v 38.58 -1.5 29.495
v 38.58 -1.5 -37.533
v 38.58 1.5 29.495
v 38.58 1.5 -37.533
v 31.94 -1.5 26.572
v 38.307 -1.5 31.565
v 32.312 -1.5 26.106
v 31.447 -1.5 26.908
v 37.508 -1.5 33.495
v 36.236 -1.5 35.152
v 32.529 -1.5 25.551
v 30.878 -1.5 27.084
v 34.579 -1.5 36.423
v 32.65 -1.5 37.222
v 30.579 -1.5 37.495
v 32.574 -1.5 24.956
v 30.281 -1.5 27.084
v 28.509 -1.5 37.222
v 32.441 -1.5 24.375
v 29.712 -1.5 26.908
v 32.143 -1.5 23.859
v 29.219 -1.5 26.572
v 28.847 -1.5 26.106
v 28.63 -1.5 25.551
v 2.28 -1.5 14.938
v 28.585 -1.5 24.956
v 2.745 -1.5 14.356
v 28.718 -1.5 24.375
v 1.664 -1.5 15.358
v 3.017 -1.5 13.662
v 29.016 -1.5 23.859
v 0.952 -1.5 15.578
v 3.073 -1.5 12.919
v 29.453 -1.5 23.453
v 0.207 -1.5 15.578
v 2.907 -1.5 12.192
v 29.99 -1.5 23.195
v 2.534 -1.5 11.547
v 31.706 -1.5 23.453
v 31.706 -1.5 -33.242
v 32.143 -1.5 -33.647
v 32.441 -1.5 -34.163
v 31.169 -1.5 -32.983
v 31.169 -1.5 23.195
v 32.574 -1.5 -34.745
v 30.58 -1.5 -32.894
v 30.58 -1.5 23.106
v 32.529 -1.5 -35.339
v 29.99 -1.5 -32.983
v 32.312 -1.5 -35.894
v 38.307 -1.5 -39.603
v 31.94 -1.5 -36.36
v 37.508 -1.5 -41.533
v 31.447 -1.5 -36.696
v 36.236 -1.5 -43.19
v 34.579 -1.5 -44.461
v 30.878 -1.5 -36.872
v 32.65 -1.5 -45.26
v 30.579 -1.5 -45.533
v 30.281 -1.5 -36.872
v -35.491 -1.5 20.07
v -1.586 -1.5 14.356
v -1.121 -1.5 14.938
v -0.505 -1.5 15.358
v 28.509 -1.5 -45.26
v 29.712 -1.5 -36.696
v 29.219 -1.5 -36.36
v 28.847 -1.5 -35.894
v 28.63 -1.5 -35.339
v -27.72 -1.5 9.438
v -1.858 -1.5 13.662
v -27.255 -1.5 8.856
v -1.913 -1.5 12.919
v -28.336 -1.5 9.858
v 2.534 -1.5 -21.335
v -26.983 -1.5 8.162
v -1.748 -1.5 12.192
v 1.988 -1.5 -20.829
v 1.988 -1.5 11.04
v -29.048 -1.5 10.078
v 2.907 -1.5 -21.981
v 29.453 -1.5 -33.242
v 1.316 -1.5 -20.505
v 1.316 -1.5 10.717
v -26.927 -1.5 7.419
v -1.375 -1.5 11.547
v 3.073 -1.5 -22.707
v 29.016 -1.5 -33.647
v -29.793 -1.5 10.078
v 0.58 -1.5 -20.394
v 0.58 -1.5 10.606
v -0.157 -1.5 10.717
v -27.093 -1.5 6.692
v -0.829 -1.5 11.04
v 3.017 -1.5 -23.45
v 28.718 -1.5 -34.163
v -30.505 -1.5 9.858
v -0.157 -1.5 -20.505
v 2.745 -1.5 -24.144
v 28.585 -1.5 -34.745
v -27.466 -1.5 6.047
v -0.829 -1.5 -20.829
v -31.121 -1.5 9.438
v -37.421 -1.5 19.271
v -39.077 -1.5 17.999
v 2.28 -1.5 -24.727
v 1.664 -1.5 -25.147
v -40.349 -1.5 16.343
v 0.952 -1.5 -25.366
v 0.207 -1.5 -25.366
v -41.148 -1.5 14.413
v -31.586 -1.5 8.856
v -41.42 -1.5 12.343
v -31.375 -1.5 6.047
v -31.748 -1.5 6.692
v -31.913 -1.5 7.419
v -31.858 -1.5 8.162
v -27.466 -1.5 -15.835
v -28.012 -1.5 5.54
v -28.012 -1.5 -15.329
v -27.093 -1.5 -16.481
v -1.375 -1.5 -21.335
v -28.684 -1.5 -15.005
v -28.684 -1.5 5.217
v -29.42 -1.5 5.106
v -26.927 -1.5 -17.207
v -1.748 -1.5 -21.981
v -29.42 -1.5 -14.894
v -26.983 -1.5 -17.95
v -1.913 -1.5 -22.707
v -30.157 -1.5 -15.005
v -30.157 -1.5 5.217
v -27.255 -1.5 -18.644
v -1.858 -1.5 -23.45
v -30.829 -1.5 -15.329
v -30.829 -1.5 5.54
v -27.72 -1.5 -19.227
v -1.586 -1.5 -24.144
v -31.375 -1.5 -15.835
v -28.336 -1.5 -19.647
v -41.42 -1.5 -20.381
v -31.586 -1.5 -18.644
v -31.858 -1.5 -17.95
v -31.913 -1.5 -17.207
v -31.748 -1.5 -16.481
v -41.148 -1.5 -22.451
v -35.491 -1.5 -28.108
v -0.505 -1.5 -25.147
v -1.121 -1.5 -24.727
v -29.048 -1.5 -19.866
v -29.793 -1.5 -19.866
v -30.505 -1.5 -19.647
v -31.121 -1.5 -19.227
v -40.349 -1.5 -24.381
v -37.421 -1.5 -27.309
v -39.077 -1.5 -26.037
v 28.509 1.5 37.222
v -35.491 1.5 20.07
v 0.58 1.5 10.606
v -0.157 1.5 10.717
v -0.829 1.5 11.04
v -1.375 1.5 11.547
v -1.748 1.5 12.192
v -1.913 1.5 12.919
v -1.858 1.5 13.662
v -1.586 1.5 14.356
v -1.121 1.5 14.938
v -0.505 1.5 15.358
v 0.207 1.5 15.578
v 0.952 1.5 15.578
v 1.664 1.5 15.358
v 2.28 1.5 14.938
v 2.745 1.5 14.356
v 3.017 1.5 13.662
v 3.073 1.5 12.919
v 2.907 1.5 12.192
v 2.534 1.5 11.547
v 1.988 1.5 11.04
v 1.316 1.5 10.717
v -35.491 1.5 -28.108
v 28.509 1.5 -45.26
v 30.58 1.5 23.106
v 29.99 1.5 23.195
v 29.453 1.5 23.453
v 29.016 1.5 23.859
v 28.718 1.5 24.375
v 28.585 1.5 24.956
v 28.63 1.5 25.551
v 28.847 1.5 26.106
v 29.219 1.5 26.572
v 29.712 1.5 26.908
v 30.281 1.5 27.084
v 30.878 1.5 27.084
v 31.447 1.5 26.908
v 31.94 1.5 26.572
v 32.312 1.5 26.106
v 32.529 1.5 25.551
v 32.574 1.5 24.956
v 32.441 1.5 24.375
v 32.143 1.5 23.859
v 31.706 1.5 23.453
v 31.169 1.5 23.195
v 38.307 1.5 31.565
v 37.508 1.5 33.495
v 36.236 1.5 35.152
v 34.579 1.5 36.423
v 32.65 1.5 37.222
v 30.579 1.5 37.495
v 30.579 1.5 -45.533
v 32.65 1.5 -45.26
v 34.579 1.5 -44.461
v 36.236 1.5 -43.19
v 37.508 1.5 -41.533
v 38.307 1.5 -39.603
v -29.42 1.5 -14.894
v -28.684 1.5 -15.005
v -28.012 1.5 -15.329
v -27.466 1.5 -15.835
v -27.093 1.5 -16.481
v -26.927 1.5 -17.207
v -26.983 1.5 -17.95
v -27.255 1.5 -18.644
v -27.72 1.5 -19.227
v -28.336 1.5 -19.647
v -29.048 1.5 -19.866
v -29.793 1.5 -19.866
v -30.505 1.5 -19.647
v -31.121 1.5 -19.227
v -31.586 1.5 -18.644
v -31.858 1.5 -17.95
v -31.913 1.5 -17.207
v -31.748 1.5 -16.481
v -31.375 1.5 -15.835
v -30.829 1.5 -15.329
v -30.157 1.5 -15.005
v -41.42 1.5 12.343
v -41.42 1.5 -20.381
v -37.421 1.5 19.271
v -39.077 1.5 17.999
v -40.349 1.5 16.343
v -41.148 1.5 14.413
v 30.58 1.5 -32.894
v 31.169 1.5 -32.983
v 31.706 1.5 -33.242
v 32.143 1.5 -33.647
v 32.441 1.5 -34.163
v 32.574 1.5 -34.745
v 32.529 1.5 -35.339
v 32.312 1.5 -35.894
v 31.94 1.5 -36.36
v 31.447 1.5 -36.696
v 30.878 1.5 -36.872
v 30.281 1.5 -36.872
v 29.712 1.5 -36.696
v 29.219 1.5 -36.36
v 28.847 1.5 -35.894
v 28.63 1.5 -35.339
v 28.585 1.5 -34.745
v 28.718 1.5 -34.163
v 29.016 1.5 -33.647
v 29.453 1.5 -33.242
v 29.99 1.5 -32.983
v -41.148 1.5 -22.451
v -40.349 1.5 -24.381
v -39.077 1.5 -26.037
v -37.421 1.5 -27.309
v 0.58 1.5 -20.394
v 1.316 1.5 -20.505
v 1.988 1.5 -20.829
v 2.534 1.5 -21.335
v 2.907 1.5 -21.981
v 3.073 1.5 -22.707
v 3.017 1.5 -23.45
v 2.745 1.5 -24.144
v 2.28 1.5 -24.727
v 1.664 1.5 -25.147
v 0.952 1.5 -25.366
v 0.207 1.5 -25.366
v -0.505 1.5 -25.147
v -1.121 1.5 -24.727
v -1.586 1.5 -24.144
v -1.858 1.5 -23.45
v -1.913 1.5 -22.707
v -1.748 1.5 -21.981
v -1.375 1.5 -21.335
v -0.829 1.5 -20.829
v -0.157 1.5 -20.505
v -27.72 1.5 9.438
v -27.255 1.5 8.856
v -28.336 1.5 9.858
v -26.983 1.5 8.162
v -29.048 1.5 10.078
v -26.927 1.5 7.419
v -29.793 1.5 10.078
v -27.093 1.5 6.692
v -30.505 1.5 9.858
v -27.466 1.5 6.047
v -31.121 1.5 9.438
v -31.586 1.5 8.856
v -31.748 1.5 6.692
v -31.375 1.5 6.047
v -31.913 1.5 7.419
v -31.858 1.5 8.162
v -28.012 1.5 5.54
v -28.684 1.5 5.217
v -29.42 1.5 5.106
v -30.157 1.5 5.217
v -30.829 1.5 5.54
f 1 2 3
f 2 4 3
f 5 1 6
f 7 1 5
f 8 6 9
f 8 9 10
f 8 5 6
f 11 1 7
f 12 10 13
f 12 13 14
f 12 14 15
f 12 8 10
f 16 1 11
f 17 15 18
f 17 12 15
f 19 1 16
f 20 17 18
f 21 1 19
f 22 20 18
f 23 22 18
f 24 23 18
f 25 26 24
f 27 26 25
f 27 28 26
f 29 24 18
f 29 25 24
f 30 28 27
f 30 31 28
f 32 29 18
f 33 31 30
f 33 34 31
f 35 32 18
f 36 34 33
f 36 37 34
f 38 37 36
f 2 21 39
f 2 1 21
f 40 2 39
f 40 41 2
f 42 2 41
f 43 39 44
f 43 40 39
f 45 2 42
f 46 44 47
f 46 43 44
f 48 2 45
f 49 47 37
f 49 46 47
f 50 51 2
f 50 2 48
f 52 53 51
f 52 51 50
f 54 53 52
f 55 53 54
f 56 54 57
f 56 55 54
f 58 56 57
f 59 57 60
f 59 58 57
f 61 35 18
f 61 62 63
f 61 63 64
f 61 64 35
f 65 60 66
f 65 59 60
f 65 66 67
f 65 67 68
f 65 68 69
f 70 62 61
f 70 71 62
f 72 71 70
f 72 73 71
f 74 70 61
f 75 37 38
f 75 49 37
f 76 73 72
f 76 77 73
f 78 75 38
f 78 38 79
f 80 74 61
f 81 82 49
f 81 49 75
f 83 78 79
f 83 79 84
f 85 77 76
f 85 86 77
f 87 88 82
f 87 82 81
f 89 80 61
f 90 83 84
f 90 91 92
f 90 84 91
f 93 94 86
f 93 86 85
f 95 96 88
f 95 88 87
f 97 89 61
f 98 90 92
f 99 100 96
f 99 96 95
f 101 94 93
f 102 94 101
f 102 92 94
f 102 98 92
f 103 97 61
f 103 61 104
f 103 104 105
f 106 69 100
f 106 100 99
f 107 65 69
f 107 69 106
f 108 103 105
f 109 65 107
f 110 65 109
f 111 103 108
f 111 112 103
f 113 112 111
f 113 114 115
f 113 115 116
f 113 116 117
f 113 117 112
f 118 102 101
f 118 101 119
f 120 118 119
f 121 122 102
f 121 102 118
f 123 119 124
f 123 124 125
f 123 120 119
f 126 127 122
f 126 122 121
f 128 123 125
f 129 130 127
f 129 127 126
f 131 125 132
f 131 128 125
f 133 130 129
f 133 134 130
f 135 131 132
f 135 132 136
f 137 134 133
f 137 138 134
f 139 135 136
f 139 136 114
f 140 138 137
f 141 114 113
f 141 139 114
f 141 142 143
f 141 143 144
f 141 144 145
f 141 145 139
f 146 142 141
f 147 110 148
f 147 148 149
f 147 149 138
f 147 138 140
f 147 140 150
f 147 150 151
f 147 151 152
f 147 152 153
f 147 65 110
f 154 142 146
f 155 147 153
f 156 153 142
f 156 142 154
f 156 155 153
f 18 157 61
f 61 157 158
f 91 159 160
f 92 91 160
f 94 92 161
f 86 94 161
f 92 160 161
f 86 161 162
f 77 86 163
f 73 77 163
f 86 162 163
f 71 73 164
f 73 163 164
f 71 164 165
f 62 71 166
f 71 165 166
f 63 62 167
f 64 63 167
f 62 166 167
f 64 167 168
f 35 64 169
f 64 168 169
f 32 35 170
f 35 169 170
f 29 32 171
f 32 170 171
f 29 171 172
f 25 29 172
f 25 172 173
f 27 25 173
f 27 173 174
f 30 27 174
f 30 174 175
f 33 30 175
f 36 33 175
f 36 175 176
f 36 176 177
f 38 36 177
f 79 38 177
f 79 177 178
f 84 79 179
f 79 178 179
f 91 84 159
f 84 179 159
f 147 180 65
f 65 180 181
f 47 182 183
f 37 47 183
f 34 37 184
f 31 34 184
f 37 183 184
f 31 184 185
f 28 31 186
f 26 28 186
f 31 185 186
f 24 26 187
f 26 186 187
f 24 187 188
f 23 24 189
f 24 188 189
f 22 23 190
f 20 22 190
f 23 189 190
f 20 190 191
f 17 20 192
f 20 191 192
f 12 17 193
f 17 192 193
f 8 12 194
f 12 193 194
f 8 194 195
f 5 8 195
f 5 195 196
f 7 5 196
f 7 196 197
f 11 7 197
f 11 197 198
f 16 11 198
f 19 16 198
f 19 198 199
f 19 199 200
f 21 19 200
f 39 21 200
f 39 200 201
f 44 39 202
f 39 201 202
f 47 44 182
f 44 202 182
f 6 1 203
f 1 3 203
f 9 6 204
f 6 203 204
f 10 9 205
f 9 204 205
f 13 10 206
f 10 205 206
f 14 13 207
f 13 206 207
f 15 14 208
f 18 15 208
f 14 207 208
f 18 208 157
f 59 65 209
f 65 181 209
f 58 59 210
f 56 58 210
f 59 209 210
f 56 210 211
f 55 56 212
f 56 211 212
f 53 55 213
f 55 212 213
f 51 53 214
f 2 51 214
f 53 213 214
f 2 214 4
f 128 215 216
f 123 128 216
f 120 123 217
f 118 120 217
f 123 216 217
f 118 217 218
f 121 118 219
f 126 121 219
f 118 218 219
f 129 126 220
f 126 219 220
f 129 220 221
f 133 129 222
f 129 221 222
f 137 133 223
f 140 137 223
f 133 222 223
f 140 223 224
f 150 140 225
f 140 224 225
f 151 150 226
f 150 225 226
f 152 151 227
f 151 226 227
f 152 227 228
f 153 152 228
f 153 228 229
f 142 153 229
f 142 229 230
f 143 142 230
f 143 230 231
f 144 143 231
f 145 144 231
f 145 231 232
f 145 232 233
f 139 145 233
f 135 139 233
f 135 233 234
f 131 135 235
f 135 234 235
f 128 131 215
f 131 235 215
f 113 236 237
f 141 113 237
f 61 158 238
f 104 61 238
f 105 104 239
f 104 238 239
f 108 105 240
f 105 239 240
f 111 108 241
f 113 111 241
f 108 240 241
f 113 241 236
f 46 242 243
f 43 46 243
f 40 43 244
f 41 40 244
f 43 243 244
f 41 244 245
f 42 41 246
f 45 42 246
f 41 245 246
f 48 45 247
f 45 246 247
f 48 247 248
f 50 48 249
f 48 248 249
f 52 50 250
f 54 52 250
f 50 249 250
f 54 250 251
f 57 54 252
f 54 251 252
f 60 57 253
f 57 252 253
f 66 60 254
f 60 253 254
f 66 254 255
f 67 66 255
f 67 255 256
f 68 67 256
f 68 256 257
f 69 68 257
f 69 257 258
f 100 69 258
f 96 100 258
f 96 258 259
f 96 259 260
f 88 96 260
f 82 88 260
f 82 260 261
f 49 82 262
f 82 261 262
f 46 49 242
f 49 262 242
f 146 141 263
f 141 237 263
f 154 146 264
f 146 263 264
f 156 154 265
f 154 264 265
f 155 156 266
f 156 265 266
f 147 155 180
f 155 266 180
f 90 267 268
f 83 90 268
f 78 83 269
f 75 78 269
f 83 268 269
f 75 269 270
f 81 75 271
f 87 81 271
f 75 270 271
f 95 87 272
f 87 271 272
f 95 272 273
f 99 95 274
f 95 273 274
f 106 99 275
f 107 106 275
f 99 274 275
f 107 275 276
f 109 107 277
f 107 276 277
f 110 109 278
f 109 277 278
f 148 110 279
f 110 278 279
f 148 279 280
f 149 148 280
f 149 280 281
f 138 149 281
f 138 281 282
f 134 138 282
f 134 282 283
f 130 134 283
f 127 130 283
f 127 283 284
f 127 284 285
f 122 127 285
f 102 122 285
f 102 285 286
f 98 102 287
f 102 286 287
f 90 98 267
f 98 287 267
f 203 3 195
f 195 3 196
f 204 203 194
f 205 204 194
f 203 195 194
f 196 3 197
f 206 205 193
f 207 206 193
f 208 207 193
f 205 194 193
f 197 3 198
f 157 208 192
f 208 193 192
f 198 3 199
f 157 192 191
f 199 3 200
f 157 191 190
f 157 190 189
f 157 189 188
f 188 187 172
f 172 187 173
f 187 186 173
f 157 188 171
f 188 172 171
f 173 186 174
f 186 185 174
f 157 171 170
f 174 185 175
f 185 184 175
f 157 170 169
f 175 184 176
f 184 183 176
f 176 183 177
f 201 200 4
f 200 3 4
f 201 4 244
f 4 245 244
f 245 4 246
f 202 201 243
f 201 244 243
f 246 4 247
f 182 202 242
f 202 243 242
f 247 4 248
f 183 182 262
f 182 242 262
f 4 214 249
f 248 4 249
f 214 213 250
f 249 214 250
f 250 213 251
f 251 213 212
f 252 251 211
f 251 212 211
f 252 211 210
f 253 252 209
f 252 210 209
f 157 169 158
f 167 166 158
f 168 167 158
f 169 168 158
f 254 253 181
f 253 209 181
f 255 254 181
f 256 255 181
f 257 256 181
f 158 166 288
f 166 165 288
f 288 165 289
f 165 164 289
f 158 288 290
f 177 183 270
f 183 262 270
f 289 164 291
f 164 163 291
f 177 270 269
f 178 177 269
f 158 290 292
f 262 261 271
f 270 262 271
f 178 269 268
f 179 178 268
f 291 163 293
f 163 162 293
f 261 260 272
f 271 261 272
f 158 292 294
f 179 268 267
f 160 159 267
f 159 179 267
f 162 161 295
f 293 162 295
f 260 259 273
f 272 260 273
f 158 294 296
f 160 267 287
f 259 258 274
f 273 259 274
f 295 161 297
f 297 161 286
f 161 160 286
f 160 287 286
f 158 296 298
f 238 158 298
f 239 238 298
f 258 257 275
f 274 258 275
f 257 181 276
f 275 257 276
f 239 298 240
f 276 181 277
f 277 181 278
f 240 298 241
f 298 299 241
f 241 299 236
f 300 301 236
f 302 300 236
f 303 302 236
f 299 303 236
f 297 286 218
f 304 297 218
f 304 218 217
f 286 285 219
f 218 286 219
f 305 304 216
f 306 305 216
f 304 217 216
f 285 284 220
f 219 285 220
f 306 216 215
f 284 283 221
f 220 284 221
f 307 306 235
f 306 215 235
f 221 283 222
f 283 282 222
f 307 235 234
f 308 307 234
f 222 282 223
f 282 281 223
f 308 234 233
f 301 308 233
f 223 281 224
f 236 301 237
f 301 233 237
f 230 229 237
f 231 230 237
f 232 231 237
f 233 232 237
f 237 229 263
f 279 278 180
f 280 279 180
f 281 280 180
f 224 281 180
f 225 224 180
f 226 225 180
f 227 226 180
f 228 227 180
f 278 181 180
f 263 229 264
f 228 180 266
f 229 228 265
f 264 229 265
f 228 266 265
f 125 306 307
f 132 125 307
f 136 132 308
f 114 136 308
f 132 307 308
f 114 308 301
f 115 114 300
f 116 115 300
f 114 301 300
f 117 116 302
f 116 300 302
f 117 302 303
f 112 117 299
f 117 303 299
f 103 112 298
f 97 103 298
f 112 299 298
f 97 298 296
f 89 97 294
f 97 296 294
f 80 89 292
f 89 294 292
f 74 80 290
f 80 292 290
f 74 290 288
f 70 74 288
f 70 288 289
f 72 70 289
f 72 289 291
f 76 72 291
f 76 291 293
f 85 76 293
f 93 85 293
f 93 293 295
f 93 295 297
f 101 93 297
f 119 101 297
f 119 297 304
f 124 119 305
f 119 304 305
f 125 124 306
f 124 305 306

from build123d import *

# Parameters (mm, degrees)
BOSS_EXTRUDE1_DEPTH = 1.5
SKETCH3_R           = 2
SKETCH3_R_2         = 2.5
CUT_EXTRUDE1_DEPTH  = 3


with BuildPart() as part:
    # Sketch2 → Boss-Extrude1 (new, symmetric)
    with BuildSketch(Plane(origin=(0, 0, 0), x_dir=(1, 0, 0), z_dir=(0, 1, 0))):
        with BuildLine():
            Line((-41.420454545, -12.342725783), (-41.420454545, 20.380644913))
            ThreePointArc((-41.420454545, 20.380644913), (-39.767396696, 25.250585912), (-35.49137321, 28.107953363))
            Line((-35.49137321, 28.107953363), (28.50862679, 45.259953363))
            ThreePointArc((28.50862679, 45.259953363), (35.449486454, 43.879587063), (38.579545455, 37.532644913))
            Line((38.579545455, 37.532644913), (38.579545455, -29.494725783))
            ThreePointArc((38.579545455, -29.494725783), (35.449486454, -35.841667933), (28.50862679, -37.222034233))
            Line((28.50862679, -37.222034233), (-35.49137321, -20.070034233))
            ThreePointArc((-35.49137321, -20.070034233), (-39.767396696, -17.212666783), (-41.420454545, -12.342725783))
        make_face()
    extrude(amount=BOSS_EXTRUDE1_DEPTH, both=True)

    # Sketch3 → Cut-Extrude1 (cut)
    with BuildSketch(Plane(origin=(0, 1.5, 0), x_dir=(1, 0, 0), z_dir=(0, 1, 0))):
        with Locations(Location((30.579545455, 34.894152552, 0), (0, 0, 270))):
            Circle(SKETCH3_R)
        with Locations(Location((0.579545455, 22.894152552, 0), (0, 0, 270))):
            Circle(SKETCH3_R_2)
        with Locations(Location((-29.420454545, 17.394152552, 0), (0, 0, 270))):
            Circle(SKETCH3_R_2)
        with Locations(Location((30.579545455, -25.105847448, 0), (0, 0, 90))):
            Circle(SKETCH3_R)
        with Locations(Location((0.579545455, -13.105847448, 0), (0, 0, 90))):
            Circle(SKETCH3_R_2)
        with Locations(Location((-29.420454545, -7.605847448, 0), (0, 0, 90))):
            Circle(SKETCH3_R_2)
    extrude(amount=-CUT_EXTRUDE1_DEPTH, mode=Mode.SUBTRACT)


solid = part.part
